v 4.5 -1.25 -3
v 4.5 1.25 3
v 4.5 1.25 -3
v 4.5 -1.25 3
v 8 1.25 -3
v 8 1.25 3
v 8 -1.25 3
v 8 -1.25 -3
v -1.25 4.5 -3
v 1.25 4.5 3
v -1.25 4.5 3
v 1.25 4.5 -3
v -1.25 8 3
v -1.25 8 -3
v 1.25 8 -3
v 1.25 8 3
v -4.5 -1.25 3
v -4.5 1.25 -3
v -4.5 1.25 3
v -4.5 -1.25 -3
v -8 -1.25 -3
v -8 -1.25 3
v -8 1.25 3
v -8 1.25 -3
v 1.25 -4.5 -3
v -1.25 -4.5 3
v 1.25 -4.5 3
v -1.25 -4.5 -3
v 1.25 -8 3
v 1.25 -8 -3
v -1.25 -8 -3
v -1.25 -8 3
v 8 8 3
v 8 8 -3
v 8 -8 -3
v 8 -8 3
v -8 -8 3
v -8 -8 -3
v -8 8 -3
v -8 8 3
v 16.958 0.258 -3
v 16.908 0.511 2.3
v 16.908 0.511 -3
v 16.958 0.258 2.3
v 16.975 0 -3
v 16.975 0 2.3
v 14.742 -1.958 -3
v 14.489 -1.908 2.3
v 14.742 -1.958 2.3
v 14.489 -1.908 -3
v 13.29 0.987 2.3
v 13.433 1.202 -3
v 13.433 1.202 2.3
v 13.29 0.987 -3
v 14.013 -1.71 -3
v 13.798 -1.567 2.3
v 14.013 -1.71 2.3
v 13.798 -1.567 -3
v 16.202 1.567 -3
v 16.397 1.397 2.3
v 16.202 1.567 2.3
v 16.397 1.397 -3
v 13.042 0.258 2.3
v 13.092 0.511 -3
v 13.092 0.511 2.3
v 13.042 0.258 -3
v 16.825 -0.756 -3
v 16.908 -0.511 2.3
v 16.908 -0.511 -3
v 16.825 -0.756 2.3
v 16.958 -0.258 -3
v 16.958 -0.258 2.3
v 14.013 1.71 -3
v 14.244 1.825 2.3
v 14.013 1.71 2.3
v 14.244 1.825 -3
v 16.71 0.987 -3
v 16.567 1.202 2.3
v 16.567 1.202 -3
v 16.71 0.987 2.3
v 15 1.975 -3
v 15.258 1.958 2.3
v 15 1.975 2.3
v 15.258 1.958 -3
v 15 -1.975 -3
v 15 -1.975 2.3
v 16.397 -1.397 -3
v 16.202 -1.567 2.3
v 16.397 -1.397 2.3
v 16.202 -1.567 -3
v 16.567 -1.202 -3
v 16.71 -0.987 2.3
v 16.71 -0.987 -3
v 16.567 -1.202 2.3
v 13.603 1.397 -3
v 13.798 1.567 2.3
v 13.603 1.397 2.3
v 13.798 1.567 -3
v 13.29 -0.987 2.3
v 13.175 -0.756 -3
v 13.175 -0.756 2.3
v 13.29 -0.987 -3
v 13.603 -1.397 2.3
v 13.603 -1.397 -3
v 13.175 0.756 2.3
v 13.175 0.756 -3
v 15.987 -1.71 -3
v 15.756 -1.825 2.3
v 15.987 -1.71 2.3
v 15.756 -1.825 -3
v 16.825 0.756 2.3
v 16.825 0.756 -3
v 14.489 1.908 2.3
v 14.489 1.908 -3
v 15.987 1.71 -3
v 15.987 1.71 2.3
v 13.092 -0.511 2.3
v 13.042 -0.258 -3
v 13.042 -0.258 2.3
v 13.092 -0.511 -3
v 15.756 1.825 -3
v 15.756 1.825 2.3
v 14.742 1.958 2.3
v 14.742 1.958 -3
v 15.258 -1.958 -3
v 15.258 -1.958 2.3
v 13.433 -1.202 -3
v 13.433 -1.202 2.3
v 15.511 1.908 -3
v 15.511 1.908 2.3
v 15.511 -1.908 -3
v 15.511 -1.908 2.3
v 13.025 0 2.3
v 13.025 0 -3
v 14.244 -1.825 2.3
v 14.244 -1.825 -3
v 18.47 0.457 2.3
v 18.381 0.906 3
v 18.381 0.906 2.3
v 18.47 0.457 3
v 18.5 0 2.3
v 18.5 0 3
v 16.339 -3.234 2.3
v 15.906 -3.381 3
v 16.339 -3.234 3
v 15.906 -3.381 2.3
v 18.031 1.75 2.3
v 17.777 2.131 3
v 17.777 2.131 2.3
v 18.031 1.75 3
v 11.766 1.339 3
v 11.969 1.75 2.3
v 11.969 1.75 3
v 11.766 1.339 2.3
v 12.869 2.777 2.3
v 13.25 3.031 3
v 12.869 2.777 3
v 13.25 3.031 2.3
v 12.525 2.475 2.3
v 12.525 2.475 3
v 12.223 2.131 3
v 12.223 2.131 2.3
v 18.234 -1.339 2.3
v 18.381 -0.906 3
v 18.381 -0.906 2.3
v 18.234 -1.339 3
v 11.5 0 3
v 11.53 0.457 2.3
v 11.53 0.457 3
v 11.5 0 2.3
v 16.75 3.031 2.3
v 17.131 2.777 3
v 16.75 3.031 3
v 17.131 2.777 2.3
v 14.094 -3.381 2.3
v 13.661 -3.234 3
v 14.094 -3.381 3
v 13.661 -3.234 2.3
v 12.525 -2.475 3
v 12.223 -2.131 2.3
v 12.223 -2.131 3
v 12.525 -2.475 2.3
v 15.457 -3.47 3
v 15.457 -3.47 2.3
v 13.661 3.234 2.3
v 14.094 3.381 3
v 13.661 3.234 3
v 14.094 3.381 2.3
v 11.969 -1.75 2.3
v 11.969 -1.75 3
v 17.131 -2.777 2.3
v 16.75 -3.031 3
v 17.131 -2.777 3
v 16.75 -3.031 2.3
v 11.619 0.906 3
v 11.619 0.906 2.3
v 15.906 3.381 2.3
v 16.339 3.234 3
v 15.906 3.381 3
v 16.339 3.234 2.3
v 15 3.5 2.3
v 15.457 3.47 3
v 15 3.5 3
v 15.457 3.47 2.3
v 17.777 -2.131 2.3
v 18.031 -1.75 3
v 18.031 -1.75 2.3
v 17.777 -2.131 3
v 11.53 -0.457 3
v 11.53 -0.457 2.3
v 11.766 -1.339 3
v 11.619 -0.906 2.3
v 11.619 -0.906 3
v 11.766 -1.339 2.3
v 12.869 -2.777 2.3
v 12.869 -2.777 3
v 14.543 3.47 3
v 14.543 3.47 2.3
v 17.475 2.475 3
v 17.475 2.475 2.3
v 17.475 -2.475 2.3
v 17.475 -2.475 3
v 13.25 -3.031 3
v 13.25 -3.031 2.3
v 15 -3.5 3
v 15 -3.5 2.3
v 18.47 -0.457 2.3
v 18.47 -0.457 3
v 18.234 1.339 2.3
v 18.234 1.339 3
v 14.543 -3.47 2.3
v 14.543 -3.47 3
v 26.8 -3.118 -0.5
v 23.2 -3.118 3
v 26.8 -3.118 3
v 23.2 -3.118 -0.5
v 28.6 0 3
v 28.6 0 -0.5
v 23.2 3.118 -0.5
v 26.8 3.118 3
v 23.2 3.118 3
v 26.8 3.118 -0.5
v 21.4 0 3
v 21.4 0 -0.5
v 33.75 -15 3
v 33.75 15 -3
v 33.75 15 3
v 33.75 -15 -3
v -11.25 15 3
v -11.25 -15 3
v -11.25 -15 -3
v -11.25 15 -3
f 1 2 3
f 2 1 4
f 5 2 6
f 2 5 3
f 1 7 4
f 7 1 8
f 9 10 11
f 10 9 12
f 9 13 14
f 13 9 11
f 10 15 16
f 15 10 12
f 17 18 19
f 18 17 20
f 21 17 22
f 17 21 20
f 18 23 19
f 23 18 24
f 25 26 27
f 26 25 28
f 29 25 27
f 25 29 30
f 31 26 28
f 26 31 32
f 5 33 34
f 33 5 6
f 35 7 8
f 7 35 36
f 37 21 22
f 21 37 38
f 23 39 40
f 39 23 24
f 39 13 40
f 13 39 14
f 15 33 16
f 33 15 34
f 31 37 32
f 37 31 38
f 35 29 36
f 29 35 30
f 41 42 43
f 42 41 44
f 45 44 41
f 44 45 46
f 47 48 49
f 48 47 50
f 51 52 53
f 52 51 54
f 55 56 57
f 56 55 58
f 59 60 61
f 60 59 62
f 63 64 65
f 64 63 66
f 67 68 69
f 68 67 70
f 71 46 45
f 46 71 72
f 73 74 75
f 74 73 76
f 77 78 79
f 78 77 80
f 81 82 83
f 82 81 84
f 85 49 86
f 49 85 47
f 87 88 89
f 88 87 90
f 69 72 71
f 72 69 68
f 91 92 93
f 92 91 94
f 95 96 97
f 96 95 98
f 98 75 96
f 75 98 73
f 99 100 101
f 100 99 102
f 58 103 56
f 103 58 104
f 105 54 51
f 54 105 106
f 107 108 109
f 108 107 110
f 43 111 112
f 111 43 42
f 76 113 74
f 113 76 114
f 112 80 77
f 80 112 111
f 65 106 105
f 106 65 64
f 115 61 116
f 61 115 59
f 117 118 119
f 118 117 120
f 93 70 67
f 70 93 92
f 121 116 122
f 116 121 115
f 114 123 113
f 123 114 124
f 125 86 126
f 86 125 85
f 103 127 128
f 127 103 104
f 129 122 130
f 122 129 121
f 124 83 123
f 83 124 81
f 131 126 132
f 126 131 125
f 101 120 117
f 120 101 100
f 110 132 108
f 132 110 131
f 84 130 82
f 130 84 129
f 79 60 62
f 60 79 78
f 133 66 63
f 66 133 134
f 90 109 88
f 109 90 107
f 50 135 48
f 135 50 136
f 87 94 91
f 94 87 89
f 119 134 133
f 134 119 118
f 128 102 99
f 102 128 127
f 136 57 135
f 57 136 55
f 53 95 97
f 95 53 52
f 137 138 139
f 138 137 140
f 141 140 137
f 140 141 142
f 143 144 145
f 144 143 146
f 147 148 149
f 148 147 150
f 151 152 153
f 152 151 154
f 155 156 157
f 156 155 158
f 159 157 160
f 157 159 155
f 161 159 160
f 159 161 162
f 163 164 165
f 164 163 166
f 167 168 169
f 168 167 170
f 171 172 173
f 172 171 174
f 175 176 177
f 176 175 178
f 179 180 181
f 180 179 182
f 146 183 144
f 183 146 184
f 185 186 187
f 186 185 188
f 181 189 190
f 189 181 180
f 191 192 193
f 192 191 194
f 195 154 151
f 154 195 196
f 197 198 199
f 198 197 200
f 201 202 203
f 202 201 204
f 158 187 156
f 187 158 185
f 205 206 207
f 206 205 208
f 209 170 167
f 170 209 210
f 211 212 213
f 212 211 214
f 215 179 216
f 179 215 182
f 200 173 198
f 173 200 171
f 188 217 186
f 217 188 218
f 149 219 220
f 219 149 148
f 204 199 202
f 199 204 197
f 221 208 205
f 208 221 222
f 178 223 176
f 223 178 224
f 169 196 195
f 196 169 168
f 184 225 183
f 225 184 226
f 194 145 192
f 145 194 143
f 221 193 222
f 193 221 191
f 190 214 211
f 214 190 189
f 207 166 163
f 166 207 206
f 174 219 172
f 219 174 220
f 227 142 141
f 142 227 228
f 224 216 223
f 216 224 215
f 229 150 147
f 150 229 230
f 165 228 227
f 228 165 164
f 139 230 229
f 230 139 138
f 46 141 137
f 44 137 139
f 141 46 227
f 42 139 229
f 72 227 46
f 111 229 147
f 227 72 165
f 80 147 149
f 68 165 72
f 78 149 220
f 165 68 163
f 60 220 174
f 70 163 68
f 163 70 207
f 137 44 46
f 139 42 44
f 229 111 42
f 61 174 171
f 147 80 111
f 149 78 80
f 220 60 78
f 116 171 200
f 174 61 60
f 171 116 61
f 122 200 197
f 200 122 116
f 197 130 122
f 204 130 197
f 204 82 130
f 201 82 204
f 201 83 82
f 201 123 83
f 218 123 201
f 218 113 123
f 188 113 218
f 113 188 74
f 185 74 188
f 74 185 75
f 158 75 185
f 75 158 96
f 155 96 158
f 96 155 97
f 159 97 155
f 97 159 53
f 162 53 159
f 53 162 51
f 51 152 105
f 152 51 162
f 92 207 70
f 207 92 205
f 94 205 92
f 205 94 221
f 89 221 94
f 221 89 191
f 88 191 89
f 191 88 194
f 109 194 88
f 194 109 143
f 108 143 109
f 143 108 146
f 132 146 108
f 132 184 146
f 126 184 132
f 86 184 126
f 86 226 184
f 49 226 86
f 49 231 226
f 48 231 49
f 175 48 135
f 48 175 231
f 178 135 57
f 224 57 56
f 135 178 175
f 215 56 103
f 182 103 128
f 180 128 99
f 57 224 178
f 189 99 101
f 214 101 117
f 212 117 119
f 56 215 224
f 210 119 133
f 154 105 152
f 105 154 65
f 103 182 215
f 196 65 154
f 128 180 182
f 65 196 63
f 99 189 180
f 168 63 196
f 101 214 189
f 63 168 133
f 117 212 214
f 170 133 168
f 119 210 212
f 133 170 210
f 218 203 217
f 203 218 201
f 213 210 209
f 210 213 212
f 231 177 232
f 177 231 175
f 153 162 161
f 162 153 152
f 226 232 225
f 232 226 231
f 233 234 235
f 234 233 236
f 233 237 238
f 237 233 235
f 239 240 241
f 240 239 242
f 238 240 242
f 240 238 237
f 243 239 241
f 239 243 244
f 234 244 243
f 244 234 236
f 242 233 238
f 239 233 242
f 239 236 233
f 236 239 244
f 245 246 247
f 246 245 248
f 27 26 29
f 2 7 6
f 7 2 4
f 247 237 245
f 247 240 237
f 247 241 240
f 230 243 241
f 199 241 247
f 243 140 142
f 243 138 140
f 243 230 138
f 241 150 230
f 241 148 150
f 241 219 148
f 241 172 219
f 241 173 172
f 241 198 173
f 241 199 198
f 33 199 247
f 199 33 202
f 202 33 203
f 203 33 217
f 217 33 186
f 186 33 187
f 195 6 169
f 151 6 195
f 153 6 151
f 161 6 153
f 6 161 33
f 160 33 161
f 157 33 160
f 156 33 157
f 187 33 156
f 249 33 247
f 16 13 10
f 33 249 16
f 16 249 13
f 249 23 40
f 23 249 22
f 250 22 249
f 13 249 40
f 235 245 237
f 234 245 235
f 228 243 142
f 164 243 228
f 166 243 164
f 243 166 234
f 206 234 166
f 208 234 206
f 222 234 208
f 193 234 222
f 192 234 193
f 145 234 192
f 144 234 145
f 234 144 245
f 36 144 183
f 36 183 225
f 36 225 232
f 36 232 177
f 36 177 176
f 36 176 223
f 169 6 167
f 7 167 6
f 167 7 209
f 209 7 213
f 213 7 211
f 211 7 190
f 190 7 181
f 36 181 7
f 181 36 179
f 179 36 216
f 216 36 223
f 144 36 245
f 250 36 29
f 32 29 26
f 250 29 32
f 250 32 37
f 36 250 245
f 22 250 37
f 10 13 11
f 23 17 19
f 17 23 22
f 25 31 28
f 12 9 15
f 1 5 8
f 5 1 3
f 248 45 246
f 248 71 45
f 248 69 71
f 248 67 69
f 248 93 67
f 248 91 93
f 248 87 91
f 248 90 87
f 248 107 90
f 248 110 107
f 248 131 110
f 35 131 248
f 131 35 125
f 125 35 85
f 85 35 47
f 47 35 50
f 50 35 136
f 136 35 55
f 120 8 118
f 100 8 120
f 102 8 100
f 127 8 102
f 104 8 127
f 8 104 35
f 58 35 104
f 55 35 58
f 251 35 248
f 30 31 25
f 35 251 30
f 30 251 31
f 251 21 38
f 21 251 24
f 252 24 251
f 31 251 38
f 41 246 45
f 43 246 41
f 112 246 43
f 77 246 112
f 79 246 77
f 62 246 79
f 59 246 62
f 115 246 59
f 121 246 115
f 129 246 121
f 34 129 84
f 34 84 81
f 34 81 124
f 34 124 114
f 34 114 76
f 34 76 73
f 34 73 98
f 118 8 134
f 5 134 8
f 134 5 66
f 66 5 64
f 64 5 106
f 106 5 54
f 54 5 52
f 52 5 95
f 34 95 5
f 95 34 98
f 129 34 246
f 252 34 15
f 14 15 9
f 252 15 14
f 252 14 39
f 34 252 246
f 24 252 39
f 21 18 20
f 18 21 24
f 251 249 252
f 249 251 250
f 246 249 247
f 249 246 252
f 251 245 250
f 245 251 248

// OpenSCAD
// file: configuration.scad
// Increase this if your slicer or printer make holes too tight.
extra_radius = 0.1;
extra_extrusion_width = 0.5;

// OD = outside diameter, corner to corner.
m3_nut_od = 6.1;
m3_nut_radius = m3_nut_od/2 + 0.45 + extra_radius;
m3_washer_radius = 3.5 + extra_radius;

// Major diameter of metric 3mm thread.
m3_major = 2.85;
m3_radius = m3_major/2 + extra_radius;
m3_wide_radius = m3_major/2 + extra_radius + 0.45;

// NEMA17 stepper motors.
motor_shaft_diameter = 5;
motor_shaft_radius = motor_shaft_diameter/2 + extra_radius;

// Frame brackets. M3x8mm screws work best with 3.6 mm brackets.
thickness = 3.6;

// OpenBeam or Misumi. Currently only 15x15 mm, but there is a plan
// to make models more parametric and allow 20x20 mm in the future.
extrusion = 15;

// Placement for the NEMA17 stepper motors.
motor_offset = 44;
motor_length = 47;
// main file
include <configuration.scad>;

$fn = 48;
roundness = 6;

module extrusion_cutout(h, extra) {
  difference() {
    cube([extrusion+extra, extrusion+extra, h], center=true);
    for (a = [0:90:359]) rotate([0, 0, a]) {
      translate([extrusion/2, 0, 0])
        cube([6, 2.5, h+1], center=true);
    }
  }
}

module screw_socket() {
  cylinder(r=m3_wide_radius, h=20, center=true);
  translate([0, 0, 3.8]) cylinder(r=3.5, h=5);
}

module calibration_block(height){
	difference(){
		translate([extrusion*0.75, 0, 0]) cube([3*extrusion,2*extrusion,height], center=true);
		extrusion_cutout(height+10, extra_extrusion_width*2);
		translate([extrusion,0,0]){ 
			translate([0, 0, -1.5]) screw_socket();
			translate([10, 0, (height/2)-1.5]) cylinder(r=m3_nut_radius, h=4, $fn=6, center=true);
		}
	}
}

calibration_block(6);
